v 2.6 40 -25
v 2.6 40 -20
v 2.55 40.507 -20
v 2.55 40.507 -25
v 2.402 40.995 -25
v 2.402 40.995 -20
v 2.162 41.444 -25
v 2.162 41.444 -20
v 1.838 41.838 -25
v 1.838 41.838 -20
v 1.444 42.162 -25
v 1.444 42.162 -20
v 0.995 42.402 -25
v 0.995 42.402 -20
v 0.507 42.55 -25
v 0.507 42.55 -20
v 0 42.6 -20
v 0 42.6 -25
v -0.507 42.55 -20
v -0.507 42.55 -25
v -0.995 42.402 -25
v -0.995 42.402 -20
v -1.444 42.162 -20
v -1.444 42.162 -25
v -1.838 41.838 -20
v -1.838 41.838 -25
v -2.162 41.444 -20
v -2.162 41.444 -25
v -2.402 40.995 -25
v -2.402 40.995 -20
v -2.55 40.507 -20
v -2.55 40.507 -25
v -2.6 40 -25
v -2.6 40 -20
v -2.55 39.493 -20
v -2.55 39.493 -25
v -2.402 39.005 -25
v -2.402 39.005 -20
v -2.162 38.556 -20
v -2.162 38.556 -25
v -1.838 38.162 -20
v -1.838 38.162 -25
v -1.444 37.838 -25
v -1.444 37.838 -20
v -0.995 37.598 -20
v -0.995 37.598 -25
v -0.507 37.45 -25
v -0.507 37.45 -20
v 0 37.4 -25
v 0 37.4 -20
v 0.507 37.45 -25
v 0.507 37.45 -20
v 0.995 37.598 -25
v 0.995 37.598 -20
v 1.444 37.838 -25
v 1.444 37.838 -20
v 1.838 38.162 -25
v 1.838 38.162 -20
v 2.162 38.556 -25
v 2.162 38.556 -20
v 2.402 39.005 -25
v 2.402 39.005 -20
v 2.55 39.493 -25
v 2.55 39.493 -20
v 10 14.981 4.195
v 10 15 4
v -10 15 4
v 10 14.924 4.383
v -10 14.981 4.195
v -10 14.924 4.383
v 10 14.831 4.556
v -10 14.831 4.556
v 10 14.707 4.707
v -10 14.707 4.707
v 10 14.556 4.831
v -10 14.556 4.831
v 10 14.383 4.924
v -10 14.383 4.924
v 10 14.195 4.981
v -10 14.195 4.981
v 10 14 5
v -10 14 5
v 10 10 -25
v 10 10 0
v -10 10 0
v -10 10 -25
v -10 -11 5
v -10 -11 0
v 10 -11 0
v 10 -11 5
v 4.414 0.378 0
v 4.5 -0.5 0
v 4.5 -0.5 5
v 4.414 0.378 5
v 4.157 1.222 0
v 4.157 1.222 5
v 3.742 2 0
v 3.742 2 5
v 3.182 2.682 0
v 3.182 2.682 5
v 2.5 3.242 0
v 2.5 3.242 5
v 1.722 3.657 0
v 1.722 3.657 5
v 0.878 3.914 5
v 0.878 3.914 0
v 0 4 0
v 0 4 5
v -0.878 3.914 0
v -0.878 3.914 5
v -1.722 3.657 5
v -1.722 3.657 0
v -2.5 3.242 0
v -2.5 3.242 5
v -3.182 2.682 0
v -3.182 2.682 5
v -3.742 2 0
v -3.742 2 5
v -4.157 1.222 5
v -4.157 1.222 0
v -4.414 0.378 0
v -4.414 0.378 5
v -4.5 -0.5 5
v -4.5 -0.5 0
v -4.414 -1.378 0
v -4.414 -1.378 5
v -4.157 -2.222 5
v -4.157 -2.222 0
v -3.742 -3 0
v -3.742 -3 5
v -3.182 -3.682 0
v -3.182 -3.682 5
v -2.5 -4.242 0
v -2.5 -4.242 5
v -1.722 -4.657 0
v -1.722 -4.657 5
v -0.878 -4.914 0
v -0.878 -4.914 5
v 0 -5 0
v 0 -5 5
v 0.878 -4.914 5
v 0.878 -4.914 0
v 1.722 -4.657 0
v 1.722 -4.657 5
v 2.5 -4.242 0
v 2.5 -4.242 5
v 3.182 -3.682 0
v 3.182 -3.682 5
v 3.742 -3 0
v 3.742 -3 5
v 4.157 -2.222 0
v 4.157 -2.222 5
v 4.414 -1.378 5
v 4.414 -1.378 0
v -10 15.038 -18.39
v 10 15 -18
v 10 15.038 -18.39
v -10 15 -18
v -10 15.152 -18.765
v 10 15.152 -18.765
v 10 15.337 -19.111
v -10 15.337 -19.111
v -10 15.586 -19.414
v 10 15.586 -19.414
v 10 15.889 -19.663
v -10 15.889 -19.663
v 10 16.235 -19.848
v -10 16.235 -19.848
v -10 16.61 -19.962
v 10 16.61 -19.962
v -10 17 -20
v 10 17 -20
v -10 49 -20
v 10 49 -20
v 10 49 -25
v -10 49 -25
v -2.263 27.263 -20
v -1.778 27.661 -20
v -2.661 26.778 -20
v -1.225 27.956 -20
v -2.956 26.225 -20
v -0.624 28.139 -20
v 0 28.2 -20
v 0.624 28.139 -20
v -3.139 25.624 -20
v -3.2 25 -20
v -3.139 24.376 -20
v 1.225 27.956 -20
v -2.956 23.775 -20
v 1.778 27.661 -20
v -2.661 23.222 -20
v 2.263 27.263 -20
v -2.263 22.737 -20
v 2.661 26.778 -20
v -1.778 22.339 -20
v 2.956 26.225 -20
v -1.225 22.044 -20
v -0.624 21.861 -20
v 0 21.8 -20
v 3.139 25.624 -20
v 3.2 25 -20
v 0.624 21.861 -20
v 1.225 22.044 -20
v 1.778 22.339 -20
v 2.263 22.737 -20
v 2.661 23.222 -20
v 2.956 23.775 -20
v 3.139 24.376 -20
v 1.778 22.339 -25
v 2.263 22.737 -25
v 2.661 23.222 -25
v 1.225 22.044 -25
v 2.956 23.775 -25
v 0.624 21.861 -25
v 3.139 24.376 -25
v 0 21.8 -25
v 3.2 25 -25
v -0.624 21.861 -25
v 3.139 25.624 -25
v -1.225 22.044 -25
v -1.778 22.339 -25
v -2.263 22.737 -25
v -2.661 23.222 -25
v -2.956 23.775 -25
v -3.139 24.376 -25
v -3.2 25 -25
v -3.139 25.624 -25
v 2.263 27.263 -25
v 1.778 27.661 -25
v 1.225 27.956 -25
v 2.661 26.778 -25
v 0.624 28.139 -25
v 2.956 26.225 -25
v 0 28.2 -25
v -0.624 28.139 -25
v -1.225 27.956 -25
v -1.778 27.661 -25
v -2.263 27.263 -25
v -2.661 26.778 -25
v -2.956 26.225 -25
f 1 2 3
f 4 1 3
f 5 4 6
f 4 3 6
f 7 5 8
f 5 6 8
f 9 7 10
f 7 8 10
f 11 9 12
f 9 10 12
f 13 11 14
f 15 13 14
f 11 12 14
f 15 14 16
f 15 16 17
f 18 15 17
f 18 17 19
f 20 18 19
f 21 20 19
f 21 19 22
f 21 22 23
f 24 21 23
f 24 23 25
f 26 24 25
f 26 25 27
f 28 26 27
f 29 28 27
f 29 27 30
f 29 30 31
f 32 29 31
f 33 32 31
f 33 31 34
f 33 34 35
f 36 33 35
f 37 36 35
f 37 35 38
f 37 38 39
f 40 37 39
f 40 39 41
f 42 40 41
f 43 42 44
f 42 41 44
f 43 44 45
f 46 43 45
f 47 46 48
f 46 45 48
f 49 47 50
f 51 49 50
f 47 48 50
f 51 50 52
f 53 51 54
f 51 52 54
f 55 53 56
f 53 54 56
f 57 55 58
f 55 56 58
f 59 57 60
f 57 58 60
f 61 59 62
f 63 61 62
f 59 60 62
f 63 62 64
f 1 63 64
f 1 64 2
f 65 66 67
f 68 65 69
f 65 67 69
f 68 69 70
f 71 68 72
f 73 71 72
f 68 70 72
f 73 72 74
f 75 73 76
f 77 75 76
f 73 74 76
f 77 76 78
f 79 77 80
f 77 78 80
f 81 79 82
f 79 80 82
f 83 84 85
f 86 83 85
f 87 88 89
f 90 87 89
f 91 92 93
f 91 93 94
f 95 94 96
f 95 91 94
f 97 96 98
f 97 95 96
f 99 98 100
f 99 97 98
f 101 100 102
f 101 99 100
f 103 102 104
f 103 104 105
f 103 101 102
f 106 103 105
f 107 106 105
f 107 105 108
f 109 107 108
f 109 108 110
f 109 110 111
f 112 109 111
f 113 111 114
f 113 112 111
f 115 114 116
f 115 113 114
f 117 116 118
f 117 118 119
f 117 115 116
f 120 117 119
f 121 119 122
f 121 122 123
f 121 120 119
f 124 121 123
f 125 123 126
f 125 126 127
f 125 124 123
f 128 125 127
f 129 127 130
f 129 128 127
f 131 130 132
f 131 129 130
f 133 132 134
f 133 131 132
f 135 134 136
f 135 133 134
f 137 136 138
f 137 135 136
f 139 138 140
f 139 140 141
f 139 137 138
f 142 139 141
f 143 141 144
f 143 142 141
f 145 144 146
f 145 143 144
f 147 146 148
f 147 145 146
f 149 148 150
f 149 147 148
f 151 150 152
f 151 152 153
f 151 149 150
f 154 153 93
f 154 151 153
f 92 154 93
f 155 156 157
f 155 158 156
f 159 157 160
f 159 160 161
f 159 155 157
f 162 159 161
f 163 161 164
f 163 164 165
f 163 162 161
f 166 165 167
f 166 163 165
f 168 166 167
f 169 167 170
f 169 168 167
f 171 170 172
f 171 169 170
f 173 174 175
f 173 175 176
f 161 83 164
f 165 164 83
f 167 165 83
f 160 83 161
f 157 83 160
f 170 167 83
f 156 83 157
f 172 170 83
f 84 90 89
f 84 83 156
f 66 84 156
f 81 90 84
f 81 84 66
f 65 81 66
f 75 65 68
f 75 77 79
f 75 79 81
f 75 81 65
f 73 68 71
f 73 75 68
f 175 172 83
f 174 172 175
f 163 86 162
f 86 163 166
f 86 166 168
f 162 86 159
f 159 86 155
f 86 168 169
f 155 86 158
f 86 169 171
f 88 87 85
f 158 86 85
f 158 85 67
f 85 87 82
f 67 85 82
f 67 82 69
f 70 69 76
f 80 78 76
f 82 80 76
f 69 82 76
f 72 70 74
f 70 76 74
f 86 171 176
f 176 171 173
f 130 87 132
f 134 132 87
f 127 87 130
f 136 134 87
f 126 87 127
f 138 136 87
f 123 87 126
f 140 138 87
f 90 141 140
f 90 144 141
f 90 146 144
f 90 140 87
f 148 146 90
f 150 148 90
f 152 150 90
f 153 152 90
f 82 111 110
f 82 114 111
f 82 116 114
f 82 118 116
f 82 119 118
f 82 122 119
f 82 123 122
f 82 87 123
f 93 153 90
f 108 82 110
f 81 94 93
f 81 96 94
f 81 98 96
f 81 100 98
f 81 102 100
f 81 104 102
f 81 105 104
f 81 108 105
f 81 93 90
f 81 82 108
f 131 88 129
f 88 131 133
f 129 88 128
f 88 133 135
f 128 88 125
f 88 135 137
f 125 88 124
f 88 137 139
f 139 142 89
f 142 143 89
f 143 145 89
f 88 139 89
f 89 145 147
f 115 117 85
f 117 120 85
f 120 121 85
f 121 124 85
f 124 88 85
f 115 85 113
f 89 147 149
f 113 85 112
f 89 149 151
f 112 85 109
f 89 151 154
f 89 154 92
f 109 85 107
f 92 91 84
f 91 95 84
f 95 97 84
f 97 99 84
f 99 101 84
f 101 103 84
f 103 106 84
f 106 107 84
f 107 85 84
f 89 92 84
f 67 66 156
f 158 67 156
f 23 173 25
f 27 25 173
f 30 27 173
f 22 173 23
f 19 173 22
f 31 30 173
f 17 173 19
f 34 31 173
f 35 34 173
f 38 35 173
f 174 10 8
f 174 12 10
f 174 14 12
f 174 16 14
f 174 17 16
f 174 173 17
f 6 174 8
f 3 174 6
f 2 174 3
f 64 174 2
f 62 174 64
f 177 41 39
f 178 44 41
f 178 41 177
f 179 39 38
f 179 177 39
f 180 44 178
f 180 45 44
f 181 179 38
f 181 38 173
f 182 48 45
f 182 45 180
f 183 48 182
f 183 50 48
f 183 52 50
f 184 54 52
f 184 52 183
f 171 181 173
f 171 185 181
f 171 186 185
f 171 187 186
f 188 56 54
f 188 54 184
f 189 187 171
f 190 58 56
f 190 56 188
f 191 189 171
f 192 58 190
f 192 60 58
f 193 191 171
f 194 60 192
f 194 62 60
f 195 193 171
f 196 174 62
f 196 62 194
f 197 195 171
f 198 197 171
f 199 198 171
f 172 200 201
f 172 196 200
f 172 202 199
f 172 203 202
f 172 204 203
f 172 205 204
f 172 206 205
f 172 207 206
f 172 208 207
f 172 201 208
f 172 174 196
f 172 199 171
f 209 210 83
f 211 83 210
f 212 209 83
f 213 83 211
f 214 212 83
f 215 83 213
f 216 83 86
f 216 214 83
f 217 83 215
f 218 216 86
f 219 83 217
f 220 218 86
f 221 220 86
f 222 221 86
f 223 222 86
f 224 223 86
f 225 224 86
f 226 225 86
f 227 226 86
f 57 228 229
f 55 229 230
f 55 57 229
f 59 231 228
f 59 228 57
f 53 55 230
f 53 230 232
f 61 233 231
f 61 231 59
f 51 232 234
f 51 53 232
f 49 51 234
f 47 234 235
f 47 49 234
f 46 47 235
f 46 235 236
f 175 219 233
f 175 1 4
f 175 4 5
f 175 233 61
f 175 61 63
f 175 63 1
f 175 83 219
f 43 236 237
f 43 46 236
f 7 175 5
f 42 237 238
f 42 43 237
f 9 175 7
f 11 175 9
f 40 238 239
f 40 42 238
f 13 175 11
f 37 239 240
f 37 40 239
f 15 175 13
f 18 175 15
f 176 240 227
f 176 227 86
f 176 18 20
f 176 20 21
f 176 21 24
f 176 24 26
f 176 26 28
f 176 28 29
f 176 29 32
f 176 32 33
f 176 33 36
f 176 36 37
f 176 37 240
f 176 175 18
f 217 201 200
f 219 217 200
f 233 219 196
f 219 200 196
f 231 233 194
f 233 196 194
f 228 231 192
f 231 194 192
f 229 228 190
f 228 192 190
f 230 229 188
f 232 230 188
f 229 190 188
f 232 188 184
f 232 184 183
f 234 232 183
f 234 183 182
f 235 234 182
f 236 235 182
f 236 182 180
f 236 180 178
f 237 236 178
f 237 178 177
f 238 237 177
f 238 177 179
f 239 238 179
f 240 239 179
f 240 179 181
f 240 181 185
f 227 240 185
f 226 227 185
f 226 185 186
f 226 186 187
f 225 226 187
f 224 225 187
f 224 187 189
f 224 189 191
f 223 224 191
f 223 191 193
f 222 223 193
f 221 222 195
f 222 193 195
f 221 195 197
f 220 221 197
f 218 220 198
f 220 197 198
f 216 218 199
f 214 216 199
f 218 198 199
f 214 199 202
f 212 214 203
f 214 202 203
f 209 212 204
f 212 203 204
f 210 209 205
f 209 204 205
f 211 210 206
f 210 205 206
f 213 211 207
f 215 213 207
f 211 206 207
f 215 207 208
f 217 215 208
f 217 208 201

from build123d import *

# Parameters (mm, degrees)
SKETCH1_R           = 4.5
BOSS_EXTRUDE1_DEPTH = 5
SKETCH2_W           = 20
SKETCH2_H           = 39
BOSS_EXTRUDE2_DEPTH = 25
CUT_EXTRUDE1_DEPTH  = 30
SKETCH4_R           = 2.6
SKETCH4_R_2         = 3.2
CUT_EXTRUDE2_DEPTH  = 10
FILLET1_R           = 2
FILLET2_R           = 1


with BuildPart() as part:
    # Sketch1 → Boss-Extrude1 (new body)
    with BuildSketch(Plane.XY):
        Polygon((-10, 10), (-10, -10), (-10, -11), (10, -11), (10, -10), (10, 10), (10, 44), (-10, 44), align=None)
        with Locations((0, -0.5)):
            Circle(SKETCH1_R, mode=Mode.SUBTRACT)
    extrude(amount=BOSS_EXTRUDE1_DEPTH)

    # Sketch2 → Boss-Extrude2 (add)
    with BuildSketch(Plane(origin=(0, 0, 0), x_dir=(-1, 0, 0), z_dir=(0, 0, -1))):
        with Locations((0, 29.5)):
            Rectangle(SKETCH2_W, SKETCH2_H)
    extrude(amount=BOSS_EXTRUDE2_DEPTH)

    # Sketch3 → Cut-Extrude1 (cut)
    with BuildSketch(Plane(origin=(10, 0, 0), x_dir=(0, 0, -1), z_dir=(1, 0, 0))):
        Polygon((0, 15), (-5, 15), (-5, 49), (20, 49), (20, 15), align=None)
    extrude(amount=-CUT_EXTRUDE1_DEPTH, mode=Mode.SUBTRACT)

    # Sketch4 → Cut-Extrude2 (cut)
    with BuildSketch(Plane.XY.offset(-20)):
        with Locations((0, 40)):
            Circle(SKETCH4_R)
        with Locations((0, 25)):
            Circle(SKETCH4_R_2)
    extrude(amount=-CUT_EXTRUDE2_DEPTH, mode=Mode.SUBTRACT)

    # Fillet1
    fillet1_edges = [part.edges().sort_by_distance(p)[0] for p in [
        (0, 15, -20),
    ]]
    fillet(fillet1_edges, radius=FILLET1_R)

    # Fillet2
    fillet2_edges = [part.edges().sort_by_distance(p)[0] for p in [
        (0, 15, 5),
    ]]
    fillet(fillet2_edges, radius=FILLET2_R)


solid = part.part
